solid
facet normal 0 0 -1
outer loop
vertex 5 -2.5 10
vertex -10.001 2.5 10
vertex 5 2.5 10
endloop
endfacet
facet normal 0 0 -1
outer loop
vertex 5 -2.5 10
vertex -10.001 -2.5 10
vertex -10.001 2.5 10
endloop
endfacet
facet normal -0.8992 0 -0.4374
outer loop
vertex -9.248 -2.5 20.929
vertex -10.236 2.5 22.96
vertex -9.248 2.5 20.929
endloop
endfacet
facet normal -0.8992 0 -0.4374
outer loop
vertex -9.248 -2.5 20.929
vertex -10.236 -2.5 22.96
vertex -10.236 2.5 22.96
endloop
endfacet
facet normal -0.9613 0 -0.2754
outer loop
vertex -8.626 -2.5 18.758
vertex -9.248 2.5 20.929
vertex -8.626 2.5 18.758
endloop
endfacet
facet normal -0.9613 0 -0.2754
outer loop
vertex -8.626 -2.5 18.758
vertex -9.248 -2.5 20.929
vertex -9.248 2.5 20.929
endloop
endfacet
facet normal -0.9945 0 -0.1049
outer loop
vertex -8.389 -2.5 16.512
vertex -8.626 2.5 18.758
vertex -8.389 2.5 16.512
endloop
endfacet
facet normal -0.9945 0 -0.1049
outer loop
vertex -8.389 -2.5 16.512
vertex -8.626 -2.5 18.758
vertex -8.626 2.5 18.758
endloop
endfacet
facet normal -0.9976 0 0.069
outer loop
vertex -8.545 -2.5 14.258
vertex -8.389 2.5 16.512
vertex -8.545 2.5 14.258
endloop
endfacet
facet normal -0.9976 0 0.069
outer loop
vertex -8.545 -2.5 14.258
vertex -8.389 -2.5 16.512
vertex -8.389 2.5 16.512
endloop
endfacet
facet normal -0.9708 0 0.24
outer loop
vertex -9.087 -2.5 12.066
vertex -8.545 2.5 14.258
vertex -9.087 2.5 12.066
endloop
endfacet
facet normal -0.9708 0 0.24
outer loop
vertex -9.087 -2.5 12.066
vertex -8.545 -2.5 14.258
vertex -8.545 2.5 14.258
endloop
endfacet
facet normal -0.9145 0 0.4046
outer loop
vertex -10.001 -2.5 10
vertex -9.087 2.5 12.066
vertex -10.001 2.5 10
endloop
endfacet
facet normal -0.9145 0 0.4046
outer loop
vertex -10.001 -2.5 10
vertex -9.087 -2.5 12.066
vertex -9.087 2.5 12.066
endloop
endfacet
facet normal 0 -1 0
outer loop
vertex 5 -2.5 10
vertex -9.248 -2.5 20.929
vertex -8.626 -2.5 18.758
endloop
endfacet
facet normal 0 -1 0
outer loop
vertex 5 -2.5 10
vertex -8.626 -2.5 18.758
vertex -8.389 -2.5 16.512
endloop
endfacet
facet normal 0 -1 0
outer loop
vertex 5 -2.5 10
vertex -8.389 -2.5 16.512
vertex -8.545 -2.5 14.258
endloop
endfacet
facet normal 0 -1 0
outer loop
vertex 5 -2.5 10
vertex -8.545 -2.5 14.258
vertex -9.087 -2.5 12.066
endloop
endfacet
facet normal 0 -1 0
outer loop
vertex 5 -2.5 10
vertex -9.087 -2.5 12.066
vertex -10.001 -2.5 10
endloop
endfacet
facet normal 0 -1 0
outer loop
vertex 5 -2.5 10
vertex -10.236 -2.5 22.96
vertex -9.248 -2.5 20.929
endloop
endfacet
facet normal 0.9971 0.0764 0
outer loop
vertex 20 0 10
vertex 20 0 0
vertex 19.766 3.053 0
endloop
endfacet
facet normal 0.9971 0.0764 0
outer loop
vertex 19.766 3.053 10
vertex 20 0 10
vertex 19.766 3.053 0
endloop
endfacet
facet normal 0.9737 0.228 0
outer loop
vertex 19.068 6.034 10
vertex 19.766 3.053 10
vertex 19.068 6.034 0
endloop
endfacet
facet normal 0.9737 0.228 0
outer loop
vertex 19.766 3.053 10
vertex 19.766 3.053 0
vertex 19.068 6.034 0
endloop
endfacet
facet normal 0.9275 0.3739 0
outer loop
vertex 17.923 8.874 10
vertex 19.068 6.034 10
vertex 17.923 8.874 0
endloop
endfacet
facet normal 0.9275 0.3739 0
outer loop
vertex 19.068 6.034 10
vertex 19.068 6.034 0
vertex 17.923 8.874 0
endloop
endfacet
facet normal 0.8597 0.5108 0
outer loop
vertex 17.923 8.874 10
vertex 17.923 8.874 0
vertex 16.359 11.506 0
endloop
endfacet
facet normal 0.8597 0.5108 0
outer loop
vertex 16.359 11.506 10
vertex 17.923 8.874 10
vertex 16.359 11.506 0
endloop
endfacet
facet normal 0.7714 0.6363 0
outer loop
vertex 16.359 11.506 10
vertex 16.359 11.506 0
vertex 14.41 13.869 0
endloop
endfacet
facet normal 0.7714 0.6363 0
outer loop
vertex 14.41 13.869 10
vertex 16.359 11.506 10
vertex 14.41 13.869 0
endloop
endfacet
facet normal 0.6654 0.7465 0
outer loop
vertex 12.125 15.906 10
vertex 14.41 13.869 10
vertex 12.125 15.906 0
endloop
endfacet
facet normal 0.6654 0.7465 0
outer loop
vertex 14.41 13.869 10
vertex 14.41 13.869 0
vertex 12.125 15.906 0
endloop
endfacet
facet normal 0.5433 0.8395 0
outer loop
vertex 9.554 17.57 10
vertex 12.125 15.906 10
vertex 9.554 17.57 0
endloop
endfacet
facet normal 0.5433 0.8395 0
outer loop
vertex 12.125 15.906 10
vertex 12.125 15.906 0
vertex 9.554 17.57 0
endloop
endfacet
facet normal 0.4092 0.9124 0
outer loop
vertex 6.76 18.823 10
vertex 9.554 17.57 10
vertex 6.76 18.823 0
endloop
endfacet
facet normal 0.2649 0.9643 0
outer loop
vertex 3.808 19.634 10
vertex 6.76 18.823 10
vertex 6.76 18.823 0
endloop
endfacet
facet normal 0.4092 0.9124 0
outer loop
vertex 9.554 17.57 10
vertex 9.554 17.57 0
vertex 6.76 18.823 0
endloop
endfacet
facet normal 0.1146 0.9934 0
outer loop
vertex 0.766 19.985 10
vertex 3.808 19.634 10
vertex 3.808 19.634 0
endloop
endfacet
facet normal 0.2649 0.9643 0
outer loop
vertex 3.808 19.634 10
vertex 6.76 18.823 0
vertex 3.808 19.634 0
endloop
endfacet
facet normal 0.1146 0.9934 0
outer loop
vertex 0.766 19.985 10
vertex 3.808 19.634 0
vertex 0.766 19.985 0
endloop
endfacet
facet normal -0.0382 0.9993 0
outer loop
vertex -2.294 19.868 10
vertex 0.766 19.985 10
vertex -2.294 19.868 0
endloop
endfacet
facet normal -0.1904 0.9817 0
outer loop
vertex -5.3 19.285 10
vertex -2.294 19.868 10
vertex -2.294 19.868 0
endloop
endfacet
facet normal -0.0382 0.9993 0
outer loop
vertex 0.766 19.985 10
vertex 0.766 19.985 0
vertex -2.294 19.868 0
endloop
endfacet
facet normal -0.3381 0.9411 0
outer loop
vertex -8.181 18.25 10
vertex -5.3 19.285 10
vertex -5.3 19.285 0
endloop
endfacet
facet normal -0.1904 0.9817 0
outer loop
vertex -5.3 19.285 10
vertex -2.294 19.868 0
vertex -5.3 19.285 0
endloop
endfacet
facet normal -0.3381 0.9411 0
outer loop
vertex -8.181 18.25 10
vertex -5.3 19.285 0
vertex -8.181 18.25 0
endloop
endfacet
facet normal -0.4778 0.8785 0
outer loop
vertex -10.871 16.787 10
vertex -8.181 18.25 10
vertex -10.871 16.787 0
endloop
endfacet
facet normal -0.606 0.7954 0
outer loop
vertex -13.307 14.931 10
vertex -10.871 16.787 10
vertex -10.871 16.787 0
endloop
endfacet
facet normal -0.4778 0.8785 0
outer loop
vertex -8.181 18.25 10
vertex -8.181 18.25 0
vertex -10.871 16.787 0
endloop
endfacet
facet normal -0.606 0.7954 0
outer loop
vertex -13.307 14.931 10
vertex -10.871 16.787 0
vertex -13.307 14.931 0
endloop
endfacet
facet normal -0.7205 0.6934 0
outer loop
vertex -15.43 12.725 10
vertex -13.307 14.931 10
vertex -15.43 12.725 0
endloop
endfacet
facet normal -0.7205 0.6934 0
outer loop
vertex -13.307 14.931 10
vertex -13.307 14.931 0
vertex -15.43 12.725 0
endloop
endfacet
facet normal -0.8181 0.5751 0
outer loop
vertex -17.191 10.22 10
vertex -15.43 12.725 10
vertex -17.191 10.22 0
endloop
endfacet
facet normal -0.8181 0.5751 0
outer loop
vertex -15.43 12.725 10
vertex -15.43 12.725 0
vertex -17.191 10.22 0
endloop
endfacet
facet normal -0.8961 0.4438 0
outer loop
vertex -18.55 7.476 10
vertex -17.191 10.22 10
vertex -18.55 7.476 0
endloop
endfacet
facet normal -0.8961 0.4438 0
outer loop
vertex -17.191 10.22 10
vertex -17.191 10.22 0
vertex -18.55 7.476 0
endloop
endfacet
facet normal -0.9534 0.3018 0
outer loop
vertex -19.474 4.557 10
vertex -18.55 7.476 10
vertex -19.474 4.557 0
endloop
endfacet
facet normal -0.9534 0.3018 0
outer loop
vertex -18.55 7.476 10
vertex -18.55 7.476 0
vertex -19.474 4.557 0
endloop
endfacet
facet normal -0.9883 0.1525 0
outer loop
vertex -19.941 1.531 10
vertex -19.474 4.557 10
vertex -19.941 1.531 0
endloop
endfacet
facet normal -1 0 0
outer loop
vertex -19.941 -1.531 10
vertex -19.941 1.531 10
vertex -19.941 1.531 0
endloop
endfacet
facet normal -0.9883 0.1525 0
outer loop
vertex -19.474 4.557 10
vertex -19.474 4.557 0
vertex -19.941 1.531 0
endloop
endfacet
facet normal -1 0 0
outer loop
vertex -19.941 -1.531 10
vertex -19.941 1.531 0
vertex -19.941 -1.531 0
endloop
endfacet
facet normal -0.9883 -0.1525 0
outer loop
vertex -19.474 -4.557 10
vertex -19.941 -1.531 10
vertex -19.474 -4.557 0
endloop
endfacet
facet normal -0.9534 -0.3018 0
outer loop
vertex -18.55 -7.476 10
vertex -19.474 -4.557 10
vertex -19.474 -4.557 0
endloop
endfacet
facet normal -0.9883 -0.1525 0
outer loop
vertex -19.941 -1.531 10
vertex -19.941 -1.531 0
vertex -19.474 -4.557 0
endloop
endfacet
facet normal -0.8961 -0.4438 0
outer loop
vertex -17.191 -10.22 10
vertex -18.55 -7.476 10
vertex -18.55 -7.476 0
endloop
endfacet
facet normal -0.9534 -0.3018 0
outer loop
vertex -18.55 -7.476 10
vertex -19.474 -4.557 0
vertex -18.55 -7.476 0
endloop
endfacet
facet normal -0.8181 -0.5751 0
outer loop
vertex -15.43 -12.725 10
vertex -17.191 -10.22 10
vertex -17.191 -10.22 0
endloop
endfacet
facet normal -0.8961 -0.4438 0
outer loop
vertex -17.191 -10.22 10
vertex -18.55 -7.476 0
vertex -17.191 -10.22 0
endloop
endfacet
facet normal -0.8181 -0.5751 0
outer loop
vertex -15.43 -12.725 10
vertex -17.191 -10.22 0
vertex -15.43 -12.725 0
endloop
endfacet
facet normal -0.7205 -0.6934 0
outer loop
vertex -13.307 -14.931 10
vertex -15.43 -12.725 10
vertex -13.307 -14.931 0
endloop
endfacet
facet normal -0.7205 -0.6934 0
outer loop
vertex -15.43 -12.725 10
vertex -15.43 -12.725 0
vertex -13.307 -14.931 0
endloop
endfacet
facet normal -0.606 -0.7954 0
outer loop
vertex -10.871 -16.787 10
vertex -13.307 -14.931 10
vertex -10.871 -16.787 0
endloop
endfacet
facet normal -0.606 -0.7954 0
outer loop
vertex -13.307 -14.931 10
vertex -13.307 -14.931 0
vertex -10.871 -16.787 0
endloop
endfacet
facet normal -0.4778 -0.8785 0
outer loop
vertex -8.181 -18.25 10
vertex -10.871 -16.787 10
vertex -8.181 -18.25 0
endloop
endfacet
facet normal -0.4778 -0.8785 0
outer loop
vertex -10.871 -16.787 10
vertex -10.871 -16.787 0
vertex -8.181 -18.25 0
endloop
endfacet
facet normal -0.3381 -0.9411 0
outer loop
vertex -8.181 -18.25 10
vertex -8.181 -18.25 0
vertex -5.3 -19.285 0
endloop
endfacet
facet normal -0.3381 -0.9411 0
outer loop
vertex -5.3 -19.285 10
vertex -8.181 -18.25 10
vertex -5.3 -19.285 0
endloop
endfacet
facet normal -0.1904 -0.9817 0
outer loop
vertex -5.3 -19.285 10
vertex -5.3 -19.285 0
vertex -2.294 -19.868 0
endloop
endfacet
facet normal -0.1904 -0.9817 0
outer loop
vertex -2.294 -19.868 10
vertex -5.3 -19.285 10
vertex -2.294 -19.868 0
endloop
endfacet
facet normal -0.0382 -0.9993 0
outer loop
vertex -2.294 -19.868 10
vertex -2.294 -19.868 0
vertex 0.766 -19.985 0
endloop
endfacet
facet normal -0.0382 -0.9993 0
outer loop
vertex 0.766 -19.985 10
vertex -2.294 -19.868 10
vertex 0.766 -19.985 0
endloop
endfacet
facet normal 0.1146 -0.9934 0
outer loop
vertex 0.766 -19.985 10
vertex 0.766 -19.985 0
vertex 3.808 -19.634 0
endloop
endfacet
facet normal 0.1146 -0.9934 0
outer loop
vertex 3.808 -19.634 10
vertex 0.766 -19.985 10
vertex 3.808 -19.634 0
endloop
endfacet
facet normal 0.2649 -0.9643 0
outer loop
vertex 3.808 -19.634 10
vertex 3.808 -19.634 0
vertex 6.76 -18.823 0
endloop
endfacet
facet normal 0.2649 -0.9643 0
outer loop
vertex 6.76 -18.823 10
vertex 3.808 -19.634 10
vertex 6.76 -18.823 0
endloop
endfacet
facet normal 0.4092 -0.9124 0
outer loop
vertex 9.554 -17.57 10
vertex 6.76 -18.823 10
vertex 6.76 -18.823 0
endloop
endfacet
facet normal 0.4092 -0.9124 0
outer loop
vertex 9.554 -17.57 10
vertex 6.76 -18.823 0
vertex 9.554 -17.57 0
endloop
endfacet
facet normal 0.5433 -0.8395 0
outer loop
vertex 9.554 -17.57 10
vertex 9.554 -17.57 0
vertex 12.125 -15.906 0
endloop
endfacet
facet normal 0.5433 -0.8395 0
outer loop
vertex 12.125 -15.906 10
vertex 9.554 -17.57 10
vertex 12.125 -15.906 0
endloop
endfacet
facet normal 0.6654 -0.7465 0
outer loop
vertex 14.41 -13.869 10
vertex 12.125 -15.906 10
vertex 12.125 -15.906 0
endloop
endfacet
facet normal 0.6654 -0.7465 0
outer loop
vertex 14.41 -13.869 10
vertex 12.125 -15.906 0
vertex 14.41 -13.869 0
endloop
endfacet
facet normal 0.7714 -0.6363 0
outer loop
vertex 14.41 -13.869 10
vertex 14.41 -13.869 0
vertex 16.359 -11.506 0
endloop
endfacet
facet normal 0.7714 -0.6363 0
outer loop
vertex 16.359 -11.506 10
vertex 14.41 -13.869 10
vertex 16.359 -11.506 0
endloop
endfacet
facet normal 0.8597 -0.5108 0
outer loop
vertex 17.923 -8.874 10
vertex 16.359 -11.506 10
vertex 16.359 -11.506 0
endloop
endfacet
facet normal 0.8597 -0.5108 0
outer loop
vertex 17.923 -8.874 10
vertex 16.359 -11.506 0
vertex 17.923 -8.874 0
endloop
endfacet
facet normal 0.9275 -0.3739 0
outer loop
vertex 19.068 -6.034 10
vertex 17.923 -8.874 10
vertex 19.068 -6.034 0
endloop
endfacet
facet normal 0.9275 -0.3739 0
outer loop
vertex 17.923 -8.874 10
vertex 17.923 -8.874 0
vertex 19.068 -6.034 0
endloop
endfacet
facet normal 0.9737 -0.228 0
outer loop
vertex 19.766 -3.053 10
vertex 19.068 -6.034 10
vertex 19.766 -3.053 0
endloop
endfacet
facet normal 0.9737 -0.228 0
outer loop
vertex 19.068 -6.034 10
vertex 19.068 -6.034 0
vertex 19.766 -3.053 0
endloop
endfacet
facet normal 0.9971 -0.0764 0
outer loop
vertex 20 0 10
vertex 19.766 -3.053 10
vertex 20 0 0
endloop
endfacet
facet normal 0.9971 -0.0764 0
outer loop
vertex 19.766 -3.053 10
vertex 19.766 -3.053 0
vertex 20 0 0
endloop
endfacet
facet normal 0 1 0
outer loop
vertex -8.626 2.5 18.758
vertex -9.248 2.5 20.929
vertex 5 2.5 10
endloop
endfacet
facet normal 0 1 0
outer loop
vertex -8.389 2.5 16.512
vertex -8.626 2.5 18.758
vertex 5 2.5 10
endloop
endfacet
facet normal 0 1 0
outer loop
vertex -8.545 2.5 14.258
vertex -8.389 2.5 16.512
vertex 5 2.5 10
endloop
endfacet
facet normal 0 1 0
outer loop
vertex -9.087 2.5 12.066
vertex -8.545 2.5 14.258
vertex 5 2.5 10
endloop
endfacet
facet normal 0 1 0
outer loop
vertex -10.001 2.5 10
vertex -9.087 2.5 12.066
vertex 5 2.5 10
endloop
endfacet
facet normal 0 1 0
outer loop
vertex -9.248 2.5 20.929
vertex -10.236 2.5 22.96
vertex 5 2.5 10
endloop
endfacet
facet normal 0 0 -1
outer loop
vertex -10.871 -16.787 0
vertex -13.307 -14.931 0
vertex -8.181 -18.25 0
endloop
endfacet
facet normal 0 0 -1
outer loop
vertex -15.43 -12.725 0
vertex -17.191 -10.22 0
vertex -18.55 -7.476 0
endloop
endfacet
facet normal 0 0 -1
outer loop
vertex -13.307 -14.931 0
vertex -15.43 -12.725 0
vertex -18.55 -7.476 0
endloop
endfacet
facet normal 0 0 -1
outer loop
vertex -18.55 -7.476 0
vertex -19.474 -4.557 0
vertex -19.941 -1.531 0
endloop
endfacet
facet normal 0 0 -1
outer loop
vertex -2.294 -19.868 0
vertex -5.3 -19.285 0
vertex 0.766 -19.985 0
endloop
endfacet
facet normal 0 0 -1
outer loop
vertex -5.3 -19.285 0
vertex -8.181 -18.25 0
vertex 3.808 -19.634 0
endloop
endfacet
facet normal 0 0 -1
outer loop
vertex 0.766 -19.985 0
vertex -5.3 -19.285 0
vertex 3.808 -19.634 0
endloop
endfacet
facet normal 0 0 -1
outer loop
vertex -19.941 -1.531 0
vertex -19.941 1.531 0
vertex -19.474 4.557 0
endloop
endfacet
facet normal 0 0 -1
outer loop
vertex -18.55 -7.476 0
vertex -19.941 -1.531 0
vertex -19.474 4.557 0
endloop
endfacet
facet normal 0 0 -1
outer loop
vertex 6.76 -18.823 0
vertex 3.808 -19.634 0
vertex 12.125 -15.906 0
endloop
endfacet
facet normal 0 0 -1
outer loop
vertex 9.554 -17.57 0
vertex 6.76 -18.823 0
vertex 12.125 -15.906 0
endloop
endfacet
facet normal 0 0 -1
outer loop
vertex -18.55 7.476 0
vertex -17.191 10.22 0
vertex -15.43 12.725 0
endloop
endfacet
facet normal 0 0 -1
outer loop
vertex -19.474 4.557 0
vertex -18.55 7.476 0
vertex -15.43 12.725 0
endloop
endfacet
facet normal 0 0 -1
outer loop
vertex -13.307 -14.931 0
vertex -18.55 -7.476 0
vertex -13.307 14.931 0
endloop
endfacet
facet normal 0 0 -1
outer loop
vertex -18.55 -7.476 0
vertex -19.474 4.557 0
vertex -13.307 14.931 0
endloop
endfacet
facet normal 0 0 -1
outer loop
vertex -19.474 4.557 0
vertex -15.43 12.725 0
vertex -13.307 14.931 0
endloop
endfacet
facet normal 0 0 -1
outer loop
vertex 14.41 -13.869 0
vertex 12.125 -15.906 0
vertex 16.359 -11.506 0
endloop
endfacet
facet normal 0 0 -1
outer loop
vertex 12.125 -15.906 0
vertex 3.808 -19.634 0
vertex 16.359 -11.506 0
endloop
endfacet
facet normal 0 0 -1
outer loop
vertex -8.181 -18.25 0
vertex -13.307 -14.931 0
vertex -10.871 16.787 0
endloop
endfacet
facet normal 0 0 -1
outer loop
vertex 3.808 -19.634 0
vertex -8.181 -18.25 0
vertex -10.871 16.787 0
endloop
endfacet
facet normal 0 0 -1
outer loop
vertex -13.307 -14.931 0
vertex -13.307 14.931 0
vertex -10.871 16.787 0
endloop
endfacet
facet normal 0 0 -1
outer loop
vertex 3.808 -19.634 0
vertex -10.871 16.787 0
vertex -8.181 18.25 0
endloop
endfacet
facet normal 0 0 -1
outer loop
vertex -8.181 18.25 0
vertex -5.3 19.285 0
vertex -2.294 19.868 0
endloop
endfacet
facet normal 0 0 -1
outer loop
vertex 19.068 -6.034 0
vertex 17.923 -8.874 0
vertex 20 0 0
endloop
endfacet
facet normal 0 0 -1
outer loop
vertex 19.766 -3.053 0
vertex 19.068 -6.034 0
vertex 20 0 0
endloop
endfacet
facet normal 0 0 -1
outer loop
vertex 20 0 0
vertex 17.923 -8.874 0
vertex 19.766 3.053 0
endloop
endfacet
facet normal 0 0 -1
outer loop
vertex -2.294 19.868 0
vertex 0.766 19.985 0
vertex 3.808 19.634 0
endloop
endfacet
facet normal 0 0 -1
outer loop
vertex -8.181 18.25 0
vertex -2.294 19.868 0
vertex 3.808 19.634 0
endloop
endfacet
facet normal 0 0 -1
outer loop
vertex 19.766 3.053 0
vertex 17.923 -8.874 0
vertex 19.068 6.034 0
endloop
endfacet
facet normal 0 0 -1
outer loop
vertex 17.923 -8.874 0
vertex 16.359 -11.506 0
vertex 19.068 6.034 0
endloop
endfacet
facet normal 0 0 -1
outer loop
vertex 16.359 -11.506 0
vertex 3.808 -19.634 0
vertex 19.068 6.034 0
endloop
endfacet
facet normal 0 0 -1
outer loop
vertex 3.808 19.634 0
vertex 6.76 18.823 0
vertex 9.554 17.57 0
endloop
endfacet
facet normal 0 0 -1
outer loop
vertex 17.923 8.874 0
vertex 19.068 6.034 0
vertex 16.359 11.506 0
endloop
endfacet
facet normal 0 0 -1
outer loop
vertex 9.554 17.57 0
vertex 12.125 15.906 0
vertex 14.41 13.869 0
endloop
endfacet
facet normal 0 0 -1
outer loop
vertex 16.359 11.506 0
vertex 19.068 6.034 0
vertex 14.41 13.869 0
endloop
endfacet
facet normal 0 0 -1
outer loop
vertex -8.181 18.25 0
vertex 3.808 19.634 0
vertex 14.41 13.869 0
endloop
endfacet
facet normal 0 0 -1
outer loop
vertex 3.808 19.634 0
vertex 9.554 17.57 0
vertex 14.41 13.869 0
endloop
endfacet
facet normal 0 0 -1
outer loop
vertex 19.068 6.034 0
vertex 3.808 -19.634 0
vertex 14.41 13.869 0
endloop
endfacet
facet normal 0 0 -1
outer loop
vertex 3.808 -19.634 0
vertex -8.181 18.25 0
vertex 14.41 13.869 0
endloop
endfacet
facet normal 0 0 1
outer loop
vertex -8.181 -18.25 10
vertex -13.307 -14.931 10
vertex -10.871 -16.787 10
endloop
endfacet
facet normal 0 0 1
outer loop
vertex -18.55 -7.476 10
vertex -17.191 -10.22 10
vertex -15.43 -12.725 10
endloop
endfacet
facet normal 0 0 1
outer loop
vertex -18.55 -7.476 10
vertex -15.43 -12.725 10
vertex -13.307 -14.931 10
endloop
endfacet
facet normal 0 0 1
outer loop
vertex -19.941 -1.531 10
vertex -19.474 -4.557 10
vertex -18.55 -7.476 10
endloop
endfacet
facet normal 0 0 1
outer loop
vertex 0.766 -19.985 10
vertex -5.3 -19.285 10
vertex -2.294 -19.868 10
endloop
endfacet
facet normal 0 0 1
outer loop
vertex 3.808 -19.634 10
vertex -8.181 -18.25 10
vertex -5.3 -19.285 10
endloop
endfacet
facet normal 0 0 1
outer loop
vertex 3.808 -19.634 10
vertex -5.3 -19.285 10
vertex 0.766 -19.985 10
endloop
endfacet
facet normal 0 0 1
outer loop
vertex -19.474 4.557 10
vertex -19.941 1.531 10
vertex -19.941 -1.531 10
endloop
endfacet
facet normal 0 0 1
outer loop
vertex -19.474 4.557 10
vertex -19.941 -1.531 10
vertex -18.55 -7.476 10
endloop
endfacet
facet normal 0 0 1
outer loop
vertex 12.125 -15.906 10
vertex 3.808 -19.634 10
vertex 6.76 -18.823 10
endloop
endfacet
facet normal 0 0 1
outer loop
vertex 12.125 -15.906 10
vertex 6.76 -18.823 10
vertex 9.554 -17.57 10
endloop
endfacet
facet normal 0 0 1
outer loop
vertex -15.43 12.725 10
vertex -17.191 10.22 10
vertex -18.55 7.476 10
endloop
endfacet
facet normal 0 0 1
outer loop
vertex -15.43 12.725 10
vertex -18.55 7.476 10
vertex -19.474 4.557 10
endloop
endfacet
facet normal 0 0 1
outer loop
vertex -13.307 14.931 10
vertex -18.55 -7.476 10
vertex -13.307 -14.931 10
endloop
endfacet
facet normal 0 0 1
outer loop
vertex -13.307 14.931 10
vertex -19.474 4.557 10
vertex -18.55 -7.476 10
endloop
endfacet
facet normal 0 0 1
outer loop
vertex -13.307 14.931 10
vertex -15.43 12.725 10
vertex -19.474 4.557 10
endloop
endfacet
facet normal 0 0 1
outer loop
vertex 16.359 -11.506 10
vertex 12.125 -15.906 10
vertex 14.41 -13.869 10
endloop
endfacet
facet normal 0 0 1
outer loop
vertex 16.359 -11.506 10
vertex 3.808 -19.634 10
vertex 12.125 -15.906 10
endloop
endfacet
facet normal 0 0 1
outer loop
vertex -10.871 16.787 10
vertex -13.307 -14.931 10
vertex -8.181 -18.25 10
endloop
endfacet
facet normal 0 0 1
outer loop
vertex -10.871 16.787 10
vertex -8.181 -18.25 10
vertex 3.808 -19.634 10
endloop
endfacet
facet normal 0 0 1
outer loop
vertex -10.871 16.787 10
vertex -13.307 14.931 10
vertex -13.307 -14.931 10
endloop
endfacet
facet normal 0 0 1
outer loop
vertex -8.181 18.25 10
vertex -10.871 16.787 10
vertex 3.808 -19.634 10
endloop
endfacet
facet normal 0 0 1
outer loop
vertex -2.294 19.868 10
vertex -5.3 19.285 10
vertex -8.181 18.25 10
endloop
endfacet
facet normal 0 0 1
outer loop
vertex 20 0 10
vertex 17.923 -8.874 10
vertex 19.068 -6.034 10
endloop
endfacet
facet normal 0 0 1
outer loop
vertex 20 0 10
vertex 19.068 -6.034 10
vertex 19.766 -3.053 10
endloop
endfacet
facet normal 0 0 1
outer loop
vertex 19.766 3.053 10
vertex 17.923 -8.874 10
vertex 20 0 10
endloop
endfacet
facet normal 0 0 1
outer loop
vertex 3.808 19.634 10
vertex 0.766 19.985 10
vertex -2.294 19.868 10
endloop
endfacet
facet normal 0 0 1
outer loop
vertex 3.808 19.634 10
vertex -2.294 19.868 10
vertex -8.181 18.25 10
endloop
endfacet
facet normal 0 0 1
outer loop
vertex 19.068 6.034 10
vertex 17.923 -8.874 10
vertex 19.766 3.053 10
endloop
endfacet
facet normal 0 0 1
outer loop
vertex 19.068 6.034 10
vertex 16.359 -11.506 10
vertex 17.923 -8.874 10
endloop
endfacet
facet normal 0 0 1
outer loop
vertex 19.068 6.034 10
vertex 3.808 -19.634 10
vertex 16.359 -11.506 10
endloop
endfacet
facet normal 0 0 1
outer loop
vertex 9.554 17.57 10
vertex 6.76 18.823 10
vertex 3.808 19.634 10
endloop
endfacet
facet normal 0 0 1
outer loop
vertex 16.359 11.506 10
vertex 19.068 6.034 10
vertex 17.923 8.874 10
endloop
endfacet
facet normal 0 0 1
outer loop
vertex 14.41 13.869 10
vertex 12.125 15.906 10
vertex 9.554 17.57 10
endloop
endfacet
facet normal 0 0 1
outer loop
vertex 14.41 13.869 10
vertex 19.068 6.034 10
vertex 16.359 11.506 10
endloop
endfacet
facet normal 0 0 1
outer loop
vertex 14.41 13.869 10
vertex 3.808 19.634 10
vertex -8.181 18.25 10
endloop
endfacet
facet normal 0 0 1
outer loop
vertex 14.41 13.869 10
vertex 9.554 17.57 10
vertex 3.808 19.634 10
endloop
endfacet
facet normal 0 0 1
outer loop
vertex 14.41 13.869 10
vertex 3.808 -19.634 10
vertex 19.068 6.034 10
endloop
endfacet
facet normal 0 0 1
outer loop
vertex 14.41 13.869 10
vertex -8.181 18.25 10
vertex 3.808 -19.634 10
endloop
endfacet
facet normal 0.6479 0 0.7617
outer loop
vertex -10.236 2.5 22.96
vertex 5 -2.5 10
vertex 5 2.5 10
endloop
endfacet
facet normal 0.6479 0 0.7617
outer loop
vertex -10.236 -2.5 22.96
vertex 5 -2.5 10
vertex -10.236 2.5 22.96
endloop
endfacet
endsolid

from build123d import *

# Parameters (mm, degrees)
F0_R     = 20
F1_DEPTH = 10
F4_DEPTH = 2.5


with BuildPart() as f1:
    # F0 (on Top) → F1 (new body)
    with BuildSketch(Plane.XY):
        Circle(F0_R)
    extrude(amount=F1_DEPTH)


with BuildPart() as f4:
    # F3 (on Front) → F4 (new body, symmetric)
    with BuildSketch(Plane.XZ):
        with BuildLine():
            Line((-10.000816, 10.000104), (4.999548, 10.000104))
            Line((4.999548, 10.000104), (-10.235757, 22.96035))
            ThreePointArc((-10.235757, 22.96035), (-8.389302, 16.51157), (-10.000816, 10.000104))
        make_face()
    extrude(amount=F4_DEPTH, both=True)


solid = Compound([f1.part, f4.part])
